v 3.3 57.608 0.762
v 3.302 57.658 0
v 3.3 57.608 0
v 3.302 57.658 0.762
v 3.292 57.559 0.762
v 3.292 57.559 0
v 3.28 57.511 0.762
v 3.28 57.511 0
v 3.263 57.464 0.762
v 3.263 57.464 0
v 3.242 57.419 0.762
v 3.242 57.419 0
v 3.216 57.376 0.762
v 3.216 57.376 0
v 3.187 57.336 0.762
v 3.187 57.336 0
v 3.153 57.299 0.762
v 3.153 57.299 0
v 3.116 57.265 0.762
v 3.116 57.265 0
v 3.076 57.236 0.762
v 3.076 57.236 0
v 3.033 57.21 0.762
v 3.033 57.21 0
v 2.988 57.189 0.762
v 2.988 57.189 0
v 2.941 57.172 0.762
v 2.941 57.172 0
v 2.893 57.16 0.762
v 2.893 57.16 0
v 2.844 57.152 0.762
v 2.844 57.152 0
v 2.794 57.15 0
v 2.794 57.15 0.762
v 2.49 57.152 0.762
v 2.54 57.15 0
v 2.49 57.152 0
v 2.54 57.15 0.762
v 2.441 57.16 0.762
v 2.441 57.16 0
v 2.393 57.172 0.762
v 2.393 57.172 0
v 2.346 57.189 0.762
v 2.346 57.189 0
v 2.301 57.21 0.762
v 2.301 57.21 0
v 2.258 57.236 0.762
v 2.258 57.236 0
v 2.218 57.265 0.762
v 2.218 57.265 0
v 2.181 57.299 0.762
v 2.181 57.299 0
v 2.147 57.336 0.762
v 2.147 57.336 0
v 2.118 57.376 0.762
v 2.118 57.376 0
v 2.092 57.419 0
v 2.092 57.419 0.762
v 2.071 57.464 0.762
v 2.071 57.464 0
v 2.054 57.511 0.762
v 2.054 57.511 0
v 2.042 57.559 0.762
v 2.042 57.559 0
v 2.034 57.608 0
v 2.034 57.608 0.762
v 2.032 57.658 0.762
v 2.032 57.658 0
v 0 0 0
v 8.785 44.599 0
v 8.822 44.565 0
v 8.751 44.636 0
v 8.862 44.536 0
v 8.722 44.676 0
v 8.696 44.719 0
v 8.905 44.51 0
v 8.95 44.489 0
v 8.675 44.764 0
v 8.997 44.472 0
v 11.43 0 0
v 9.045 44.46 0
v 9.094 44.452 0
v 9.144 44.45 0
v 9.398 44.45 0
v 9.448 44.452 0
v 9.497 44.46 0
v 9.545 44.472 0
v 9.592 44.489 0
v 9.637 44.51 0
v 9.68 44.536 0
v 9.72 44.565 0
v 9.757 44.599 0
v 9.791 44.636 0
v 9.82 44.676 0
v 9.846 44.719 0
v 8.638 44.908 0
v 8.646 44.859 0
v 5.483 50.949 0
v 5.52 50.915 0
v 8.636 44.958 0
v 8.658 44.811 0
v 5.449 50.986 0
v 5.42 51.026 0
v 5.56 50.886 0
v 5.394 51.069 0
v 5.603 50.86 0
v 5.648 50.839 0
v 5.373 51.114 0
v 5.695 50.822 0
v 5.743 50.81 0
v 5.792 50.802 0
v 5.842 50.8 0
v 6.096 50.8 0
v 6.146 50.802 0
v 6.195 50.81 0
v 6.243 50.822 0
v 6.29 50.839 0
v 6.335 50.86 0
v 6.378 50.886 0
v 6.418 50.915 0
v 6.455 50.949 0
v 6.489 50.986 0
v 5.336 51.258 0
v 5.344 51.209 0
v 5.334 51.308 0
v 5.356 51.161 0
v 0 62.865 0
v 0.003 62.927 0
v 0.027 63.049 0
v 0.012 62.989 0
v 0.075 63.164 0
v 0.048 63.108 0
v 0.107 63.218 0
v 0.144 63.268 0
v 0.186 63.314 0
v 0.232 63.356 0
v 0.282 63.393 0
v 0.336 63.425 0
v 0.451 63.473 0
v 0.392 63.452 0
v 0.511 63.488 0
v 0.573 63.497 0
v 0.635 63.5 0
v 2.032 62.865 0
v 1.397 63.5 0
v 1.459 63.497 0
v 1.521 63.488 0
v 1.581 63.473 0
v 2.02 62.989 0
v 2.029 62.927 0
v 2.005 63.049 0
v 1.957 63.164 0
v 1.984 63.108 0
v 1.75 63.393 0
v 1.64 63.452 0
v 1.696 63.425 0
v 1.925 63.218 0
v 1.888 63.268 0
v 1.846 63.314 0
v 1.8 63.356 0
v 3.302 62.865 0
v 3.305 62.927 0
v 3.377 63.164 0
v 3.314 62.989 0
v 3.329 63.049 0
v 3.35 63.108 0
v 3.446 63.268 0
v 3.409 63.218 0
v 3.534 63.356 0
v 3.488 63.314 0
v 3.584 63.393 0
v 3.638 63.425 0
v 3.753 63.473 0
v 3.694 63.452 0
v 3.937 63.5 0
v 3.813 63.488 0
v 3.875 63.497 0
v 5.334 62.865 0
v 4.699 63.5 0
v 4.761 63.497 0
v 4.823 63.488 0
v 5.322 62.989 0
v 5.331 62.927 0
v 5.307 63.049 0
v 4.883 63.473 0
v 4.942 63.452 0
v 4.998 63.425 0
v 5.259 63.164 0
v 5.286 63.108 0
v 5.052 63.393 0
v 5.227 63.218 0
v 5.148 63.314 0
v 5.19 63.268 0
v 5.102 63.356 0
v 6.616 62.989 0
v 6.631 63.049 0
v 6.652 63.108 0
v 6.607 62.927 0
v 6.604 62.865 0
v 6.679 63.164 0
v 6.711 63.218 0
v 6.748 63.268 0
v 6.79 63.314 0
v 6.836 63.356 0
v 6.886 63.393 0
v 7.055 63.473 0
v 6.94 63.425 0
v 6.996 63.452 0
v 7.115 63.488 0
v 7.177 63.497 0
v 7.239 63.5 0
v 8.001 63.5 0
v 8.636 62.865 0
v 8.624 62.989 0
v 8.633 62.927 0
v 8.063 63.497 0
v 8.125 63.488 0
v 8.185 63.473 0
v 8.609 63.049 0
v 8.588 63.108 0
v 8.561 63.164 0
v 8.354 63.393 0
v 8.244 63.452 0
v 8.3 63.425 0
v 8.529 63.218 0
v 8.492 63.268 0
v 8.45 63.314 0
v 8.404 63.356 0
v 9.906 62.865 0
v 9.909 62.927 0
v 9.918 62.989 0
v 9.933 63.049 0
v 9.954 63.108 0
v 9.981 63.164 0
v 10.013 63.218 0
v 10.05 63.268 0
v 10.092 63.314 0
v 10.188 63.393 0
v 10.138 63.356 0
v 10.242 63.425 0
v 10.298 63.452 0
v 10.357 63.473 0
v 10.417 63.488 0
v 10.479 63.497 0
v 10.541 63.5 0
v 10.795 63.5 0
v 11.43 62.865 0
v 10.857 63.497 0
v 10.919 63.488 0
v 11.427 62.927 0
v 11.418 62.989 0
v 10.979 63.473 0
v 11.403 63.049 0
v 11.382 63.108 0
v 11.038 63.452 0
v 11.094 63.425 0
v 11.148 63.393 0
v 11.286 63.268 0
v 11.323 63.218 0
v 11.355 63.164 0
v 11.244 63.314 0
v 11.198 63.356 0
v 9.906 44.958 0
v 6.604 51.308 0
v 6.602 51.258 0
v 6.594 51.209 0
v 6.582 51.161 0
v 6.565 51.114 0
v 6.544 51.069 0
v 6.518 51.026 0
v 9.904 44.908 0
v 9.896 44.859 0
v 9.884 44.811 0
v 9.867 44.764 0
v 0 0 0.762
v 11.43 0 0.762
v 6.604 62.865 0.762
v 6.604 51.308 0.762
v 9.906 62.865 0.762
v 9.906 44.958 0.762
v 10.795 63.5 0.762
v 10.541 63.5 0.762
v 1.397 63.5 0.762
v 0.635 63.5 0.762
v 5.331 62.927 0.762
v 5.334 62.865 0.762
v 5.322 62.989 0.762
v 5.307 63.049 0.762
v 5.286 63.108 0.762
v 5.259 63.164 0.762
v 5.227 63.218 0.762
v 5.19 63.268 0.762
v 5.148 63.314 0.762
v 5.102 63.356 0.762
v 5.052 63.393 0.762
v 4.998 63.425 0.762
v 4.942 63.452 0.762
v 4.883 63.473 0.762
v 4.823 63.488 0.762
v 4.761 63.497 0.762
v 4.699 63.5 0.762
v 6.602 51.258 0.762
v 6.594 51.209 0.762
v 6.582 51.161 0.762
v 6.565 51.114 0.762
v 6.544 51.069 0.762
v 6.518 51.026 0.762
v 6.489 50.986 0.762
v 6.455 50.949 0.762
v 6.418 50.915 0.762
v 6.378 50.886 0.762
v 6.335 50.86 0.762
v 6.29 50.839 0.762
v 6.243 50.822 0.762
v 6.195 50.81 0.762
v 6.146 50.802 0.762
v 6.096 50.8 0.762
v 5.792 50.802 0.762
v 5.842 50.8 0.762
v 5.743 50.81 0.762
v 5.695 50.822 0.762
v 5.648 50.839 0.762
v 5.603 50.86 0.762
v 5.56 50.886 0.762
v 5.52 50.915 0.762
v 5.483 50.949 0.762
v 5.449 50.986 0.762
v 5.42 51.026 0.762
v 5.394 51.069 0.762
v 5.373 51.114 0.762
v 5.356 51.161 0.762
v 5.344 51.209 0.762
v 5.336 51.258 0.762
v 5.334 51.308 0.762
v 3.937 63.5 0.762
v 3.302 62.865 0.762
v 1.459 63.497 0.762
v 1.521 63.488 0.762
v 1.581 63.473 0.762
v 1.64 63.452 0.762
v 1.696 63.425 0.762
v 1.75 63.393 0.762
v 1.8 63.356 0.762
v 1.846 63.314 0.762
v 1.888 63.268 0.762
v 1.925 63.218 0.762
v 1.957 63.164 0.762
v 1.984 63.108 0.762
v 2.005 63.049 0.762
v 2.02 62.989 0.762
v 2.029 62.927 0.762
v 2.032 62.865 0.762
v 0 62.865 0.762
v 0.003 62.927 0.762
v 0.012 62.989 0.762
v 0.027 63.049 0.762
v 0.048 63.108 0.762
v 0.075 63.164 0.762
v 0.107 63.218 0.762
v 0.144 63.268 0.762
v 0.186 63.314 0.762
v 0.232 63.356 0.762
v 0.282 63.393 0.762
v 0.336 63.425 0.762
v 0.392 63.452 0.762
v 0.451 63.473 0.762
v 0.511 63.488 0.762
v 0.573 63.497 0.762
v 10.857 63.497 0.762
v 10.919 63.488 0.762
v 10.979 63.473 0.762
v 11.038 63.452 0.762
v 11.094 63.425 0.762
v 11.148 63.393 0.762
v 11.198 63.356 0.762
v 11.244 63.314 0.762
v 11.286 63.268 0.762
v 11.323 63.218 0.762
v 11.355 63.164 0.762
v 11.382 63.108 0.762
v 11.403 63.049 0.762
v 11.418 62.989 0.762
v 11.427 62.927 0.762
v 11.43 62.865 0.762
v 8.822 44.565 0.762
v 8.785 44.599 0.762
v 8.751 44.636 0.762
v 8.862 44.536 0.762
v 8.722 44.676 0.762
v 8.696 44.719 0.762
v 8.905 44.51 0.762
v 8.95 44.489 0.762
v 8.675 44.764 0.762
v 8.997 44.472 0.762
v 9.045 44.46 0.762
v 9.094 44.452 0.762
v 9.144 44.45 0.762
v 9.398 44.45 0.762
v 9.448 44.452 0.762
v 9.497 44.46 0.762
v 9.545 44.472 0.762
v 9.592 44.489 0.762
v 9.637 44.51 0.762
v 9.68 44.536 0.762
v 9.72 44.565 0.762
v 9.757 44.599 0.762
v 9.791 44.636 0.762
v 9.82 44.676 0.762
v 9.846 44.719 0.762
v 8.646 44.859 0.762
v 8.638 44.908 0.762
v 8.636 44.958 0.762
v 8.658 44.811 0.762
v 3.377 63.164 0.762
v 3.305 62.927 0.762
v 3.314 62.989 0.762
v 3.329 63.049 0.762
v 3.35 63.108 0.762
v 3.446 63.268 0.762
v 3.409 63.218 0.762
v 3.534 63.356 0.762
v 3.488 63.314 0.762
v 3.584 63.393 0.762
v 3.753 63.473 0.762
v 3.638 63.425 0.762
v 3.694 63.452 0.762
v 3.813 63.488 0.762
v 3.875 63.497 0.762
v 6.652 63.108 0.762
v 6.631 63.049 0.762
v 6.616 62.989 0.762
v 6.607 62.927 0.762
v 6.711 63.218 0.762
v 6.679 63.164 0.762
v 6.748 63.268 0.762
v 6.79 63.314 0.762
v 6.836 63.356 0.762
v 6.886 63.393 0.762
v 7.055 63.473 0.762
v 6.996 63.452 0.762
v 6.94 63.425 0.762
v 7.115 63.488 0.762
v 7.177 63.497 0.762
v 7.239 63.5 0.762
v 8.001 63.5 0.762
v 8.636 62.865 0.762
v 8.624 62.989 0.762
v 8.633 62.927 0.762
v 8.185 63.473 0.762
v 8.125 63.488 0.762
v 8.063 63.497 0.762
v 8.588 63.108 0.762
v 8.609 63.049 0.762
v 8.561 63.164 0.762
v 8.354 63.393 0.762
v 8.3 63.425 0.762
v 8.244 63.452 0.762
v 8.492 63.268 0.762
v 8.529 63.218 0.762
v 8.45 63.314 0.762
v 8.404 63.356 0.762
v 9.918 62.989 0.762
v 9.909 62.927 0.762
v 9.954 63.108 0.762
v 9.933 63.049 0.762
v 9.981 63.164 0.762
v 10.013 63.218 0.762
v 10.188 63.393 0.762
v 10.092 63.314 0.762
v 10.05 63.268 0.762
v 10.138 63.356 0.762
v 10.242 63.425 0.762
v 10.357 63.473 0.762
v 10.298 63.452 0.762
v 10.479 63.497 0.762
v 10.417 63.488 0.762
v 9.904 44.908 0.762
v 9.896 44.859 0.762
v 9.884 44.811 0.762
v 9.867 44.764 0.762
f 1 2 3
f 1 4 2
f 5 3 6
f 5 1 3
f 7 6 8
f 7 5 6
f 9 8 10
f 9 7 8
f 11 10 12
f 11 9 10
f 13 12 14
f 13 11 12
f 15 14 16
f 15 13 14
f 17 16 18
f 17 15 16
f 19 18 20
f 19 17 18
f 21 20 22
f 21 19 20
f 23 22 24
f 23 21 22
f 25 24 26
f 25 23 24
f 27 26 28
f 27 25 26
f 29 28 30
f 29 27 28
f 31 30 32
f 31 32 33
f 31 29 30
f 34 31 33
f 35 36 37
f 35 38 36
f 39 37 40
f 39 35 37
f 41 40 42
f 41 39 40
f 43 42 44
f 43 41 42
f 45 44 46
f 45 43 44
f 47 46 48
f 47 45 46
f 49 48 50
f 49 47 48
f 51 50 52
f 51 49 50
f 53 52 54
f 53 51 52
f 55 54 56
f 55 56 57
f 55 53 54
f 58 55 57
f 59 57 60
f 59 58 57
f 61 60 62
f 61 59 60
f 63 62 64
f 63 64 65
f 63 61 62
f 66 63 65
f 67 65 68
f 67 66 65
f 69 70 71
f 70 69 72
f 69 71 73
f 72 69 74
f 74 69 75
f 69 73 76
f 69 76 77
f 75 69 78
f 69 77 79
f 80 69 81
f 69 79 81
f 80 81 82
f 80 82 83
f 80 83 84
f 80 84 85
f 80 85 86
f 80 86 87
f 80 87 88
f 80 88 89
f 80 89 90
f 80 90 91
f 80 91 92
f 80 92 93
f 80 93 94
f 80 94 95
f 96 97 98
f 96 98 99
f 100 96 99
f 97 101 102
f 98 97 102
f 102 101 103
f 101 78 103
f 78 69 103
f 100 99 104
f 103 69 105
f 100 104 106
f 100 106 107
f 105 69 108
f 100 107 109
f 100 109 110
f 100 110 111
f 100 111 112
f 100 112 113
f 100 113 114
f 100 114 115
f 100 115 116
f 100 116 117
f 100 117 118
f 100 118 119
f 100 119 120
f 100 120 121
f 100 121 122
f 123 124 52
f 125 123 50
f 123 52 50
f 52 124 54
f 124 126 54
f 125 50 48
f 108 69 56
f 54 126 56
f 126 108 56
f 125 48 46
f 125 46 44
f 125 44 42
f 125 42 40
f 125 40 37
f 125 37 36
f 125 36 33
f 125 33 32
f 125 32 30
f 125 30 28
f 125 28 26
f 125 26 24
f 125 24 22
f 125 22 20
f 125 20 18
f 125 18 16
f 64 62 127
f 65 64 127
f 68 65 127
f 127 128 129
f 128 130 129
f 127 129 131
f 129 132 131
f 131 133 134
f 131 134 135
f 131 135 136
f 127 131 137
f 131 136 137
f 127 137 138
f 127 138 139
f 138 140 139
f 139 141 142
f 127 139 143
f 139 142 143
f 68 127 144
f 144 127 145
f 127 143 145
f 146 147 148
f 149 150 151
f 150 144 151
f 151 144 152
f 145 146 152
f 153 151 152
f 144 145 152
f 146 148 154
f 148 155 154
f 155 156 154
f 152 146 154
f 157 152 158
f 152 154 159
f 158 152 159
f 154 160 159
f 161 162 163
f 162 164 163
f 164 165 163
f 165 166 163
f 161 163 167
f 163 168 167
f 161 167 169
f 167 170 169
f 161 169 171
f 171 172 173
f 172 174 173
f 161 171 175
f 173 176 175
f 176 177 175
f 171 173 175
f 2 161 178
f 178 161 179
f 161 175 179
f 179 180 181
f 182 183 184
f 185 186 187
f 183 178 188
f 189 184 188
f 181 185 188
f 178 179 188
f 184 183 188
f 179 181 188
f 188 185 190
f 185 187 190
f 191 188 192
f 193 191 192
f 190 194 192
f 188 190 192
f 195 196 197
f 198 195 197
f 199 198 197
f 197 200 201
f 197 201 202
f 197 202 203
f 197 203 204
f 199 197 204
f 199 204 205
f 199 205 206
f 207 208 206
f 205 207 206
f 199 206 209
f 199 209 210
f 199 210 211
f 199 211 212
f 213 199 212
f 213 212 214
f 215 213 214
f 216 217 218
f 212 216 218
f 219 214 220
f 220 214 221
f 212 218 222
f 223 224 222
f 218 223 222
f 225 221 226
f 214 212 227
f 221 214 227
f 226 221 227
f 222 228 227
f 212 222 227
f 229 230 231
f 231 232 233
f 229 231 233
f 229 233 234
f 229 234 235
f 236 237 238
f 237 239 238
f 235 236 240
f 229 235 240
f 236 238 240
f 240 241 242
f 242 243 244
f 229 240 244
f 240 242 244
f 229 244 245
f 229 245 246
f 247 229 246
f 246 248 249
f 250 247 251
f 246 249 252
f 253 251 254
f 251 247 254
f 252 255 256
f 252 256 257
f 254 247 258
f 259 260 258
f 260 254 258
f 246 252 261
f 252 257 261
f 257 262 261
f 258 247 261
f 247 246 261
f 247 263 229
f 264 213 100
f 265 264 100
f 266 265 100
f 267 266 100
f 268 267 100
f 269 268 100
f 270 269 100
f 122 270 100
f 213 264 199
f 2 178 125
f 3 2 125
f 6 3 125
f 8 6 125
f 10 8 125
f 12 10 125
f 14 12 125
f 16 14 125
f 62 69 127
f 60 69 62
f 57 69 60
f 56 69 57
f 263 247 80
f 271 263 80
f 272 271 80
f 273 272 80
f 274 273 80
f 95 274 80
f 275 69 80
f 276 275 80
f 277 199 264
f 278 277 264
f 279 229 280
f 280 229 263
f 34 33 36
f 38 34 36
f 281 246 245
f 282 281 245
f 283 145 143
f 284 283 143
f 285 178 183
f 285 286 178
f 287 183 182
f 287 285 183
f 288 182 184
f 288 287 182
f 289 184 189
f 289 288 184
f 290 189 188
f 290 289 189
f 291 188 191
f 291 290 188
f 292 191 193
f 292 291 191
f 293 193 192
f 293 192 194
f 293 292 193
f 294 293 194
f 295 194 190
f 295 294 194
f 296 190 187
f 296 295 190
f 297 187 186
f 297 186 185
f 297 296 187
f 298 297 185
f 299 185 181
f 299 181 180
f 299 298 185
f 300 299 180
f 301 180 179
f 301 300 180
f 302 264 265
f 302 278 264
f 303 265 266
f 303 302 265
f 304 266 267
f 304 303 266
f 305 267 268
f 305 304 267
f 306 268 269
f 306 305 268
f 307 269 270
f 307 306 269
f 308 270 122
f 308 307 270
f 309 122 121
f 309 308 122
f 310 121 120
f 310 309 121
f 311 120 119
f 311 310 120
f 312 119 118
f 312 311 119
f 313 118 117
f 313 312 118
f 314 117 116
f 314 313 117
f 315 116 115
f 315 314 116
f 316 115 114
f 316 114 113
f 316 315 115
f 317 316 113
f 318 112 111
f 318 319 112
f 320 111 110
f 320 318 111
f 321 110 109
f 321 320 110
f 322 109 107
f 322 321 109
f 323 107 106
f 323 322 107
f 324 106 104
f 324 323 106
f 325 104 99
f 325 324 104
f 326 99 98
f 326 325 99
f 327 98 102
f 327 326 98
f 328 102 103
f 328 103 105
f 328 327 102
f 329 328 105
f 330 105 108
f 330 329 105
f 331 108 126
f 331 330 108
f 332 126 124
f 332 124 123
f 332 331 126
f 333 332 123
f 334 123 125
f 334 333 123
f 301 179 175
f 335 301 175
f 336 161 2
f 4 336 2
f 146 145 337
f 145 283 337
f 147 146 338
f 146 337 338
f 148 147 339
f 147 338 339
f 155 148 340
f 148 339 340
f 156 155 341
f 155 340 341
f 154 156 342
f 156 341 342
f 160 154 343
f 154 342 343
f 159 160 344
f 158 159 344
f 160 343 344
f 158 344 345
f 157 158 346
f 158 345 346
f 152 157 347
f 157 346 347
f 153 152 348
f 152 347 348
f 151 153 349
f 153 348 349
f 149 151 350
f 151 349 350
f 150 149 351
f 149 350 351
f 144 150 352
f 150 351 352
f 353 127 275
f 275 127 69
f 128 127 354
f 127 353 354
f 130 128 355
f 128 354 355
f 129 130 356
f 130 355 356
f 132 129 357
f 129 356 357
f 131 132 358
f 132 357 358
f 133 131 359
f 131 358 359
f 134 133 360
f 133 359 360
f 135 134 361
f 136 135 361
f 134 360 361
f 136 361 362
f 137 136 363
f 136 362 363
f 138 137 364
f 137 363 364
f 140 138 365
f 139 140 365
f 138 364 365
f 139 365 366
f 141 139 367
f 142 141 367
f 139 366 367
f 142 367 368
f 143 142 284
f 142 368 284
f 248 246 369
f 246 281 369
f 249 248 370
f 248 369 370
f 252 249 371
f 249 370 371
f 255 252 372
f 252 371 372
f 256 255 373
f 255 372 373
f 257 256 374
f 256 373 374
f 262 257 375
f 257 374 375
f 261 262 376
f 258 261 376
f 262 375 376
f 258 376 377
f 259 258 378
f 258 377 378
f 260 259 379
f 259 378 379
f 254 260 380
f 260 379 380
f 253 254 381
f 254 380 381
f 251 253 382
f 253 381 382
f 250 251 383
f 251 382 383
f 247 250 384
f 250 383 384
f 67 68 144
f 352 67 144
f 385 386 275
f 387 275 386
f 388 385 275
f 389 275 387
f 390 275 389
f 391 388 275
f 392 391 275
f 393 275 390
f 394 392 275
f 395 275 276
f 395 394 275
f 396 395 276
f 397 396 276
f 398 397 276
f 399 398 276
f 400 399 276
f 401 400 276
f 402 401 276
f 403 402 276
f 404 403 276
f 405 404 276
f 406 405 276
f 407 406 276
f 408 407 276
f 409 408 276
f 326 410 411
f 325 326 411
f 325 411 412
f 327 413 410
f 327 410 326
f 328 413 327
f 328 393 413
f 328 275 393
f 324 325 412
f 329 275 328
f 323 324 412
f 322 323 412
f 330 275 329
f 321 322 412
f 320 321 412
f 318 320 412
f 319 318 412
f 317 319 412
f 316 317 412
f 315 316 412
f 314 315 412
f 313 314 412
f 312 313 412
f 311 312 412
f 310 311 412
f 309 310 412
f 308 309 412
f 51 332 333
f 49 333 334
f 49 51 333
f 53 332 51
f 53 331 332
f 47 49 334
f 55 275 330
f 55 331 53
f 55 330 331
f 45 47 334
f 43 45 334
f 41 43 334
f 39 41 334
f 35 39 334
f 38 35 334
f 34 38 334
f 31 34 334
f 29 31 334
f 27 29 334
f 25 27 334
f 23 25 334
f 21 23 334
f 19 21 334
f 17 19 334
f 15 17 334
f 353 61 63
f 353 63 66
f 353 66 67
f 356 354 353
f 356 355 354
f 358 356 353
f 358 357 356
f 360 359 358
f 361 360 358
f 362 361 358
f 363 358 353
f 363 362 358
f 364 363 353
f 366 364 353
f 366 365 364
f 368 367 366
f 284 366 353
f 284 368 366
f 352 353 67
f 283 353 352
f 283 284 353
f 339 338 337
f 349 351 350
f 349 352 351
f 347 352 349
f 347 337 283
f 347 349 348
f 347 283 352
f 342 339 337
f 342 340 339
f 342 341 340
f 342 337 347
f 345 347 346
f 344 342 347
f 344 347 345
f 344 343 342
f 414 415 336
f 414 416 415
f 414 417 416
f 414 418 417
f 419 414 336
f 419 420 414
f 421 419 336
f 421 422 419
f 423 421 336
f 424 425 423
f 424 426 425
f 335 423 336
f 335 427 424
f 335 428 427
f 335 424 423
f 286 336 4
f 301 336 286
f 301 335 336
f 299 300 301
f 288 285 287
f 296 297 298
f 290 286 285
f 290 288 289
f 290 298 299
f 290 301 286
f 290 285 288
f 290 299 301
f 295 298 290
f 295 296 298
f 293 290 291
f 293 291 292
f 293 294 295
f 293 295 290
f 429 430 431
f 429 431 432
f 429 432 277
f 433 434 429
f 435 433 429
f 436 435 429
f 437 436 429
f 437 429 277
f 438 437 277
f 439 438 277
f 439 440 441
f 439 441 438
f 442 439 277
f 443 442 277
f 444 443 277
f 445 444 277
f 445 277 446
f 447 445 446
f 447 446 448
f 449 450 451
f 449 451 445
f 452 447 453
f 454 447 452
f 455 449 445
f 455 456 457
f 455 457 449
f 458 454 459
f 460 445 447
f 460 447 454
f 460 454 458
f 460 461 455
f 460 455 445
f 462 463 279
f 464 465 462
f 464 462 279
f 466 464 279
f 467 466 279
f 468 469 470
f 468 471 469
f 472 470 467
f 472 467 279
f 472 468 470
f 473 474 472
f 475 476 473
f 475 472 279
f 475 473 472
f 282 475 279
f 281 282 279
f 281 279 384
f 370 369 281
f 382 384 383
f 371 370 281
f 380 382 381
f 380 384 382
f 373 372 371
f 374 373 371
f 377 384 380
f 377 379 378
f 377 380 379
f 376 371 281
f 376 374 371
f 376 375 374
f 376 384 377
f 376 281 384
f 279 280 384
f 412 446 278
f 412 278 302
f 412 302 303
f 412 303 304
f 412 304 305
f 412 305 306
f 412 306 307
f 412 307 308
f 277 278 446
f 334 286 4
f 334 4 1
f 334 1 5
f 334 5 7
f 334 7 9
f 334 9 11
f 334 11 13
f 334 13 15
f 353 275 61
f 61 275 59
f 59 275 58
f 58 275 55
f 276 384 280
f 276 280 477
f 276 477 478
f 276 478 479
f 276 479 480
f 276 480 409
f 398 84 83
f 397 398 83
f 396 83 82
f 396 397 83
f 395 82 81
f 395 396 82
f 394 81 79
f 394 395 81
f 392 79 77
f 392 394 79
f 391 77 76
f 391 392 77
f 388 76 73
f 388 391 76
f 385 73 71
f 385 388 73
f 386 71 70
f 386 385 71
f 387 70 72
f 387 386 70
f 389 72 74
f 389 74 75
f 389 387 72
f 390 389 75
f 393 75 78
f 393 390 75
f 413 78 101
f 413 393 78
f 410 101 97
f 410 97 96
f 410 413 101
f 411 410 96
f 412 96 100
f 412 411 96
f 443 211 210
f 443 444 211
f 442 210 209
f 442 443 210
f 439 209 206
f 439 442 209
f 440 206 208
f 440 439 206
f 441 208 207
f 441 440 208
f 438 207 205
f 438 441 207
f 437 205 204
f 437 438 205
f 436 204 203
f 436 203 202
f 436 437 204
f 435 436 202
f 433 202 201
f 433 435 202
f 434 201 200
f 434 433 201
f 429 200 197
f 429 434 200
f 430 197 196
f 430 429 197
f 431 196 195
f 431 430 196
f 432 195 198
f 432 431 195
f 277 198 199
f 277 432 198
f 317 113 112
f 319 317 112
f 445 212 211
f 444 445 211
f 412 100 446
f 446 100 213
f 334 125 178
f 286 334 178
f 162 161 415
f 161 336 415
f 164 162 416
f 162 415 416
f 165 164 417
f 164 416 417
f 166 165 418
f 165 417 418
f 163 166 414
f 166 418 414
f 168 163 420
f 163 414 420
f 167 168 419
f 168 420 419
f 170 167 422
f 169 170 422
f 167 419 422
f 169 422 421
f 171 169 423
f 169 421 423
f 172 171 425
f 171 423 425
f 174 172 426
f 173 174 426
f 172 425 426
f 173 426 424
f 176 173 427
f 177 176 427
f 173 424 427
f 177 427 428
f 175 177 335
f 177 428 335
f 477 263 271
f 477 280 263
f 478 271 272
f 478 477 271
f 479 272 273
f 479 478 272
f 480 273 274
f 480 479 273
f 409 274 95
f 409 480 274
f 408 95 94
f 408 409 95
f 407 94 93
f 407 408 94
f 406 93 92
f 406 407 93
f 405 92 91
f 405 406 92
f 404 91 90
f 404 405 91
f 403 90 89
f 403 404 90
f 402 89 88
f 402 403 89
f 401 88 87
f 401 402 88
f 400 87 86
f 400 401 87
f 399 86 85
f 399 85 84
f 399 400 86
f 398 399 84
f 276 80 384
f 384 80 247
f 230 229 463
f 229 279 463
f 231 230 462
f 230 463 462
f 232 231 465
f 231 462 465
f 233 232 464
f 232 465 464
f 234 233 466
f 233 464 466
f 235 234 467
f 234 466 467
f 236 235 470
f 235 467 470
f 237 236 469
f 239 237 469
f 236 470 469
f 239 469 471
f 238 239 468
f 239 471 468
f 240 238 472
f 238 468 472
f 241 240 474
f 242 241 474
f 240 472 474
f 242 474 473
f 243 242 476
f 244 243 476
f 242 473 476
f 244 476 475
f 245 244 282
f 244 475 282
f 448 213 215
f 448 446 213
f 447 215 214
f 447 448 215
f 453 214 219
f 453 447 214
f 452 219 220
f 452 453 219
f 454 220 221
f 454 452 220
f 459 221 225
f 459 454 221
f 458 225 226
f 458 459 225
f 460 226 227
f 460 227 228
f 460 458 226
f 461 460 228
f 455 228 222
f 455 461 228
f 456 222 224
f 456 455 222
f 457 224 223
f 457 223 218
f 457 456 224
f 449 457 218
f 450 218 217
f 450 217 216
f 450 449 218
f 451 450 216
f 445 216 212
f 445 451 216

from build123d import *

# Parameters (mm, degrees)
F1_DEPTH = 0.762
F2_R     = 0.508
F3_R     = 0.635


with BuildPart() as f1:
    # F0 (on Top) → F1 (new body)
    with BuildSketch(Plane.XY):
        Polygon((0, 63.5), (0, 0), (11.43, 0), (11.43, 63.5), (9.906, 63.5), (9.906, 44.45), (8.636, 44.45), (8.636, 63.5), (6.604, 63.5), (6.604, 50.8), (5.334, 50.8), (5.334, 63.5), (3.302, 63.5), (3.302, 57.15), (2.032, 57.15), (2.032, 63.5), align=None)
    extrude(amount=F1_DEPTH)

    # F2
    f2_edges = [f1.edges().sort_by_distance(p)[0] for p in [
        (2.032, 57.15, 0.381),
        (3.302, 57.15, 0.381),
        (5.334, 50.8, 0.381),
        (6.604, 50.8, 0.381),
        (9.906, 44.45, 0.381),
        (8.636, 44.45, 0.381),
    ]]
    fillet(f2_edges, radius=F2_R)

    # F3
    f3_edges = [f1.edges().sort_by_distance(p)[0] for p in [
        (0, 63.5, 0.381),
        (2.032, 63.5, 0.381),
        (3.302, 63.5, 0.381),
        (5.334, 63.5, 0.381),
        (6.604, 63.5, 0.381),
        (8.636, 63.5, 0.381),
        (9.906, 63.5, 0.381),
        (11.43, 63.5, 0.381),
    ]]
    fillet(f3_edges, radius=F3_R)


solid = f1.part
